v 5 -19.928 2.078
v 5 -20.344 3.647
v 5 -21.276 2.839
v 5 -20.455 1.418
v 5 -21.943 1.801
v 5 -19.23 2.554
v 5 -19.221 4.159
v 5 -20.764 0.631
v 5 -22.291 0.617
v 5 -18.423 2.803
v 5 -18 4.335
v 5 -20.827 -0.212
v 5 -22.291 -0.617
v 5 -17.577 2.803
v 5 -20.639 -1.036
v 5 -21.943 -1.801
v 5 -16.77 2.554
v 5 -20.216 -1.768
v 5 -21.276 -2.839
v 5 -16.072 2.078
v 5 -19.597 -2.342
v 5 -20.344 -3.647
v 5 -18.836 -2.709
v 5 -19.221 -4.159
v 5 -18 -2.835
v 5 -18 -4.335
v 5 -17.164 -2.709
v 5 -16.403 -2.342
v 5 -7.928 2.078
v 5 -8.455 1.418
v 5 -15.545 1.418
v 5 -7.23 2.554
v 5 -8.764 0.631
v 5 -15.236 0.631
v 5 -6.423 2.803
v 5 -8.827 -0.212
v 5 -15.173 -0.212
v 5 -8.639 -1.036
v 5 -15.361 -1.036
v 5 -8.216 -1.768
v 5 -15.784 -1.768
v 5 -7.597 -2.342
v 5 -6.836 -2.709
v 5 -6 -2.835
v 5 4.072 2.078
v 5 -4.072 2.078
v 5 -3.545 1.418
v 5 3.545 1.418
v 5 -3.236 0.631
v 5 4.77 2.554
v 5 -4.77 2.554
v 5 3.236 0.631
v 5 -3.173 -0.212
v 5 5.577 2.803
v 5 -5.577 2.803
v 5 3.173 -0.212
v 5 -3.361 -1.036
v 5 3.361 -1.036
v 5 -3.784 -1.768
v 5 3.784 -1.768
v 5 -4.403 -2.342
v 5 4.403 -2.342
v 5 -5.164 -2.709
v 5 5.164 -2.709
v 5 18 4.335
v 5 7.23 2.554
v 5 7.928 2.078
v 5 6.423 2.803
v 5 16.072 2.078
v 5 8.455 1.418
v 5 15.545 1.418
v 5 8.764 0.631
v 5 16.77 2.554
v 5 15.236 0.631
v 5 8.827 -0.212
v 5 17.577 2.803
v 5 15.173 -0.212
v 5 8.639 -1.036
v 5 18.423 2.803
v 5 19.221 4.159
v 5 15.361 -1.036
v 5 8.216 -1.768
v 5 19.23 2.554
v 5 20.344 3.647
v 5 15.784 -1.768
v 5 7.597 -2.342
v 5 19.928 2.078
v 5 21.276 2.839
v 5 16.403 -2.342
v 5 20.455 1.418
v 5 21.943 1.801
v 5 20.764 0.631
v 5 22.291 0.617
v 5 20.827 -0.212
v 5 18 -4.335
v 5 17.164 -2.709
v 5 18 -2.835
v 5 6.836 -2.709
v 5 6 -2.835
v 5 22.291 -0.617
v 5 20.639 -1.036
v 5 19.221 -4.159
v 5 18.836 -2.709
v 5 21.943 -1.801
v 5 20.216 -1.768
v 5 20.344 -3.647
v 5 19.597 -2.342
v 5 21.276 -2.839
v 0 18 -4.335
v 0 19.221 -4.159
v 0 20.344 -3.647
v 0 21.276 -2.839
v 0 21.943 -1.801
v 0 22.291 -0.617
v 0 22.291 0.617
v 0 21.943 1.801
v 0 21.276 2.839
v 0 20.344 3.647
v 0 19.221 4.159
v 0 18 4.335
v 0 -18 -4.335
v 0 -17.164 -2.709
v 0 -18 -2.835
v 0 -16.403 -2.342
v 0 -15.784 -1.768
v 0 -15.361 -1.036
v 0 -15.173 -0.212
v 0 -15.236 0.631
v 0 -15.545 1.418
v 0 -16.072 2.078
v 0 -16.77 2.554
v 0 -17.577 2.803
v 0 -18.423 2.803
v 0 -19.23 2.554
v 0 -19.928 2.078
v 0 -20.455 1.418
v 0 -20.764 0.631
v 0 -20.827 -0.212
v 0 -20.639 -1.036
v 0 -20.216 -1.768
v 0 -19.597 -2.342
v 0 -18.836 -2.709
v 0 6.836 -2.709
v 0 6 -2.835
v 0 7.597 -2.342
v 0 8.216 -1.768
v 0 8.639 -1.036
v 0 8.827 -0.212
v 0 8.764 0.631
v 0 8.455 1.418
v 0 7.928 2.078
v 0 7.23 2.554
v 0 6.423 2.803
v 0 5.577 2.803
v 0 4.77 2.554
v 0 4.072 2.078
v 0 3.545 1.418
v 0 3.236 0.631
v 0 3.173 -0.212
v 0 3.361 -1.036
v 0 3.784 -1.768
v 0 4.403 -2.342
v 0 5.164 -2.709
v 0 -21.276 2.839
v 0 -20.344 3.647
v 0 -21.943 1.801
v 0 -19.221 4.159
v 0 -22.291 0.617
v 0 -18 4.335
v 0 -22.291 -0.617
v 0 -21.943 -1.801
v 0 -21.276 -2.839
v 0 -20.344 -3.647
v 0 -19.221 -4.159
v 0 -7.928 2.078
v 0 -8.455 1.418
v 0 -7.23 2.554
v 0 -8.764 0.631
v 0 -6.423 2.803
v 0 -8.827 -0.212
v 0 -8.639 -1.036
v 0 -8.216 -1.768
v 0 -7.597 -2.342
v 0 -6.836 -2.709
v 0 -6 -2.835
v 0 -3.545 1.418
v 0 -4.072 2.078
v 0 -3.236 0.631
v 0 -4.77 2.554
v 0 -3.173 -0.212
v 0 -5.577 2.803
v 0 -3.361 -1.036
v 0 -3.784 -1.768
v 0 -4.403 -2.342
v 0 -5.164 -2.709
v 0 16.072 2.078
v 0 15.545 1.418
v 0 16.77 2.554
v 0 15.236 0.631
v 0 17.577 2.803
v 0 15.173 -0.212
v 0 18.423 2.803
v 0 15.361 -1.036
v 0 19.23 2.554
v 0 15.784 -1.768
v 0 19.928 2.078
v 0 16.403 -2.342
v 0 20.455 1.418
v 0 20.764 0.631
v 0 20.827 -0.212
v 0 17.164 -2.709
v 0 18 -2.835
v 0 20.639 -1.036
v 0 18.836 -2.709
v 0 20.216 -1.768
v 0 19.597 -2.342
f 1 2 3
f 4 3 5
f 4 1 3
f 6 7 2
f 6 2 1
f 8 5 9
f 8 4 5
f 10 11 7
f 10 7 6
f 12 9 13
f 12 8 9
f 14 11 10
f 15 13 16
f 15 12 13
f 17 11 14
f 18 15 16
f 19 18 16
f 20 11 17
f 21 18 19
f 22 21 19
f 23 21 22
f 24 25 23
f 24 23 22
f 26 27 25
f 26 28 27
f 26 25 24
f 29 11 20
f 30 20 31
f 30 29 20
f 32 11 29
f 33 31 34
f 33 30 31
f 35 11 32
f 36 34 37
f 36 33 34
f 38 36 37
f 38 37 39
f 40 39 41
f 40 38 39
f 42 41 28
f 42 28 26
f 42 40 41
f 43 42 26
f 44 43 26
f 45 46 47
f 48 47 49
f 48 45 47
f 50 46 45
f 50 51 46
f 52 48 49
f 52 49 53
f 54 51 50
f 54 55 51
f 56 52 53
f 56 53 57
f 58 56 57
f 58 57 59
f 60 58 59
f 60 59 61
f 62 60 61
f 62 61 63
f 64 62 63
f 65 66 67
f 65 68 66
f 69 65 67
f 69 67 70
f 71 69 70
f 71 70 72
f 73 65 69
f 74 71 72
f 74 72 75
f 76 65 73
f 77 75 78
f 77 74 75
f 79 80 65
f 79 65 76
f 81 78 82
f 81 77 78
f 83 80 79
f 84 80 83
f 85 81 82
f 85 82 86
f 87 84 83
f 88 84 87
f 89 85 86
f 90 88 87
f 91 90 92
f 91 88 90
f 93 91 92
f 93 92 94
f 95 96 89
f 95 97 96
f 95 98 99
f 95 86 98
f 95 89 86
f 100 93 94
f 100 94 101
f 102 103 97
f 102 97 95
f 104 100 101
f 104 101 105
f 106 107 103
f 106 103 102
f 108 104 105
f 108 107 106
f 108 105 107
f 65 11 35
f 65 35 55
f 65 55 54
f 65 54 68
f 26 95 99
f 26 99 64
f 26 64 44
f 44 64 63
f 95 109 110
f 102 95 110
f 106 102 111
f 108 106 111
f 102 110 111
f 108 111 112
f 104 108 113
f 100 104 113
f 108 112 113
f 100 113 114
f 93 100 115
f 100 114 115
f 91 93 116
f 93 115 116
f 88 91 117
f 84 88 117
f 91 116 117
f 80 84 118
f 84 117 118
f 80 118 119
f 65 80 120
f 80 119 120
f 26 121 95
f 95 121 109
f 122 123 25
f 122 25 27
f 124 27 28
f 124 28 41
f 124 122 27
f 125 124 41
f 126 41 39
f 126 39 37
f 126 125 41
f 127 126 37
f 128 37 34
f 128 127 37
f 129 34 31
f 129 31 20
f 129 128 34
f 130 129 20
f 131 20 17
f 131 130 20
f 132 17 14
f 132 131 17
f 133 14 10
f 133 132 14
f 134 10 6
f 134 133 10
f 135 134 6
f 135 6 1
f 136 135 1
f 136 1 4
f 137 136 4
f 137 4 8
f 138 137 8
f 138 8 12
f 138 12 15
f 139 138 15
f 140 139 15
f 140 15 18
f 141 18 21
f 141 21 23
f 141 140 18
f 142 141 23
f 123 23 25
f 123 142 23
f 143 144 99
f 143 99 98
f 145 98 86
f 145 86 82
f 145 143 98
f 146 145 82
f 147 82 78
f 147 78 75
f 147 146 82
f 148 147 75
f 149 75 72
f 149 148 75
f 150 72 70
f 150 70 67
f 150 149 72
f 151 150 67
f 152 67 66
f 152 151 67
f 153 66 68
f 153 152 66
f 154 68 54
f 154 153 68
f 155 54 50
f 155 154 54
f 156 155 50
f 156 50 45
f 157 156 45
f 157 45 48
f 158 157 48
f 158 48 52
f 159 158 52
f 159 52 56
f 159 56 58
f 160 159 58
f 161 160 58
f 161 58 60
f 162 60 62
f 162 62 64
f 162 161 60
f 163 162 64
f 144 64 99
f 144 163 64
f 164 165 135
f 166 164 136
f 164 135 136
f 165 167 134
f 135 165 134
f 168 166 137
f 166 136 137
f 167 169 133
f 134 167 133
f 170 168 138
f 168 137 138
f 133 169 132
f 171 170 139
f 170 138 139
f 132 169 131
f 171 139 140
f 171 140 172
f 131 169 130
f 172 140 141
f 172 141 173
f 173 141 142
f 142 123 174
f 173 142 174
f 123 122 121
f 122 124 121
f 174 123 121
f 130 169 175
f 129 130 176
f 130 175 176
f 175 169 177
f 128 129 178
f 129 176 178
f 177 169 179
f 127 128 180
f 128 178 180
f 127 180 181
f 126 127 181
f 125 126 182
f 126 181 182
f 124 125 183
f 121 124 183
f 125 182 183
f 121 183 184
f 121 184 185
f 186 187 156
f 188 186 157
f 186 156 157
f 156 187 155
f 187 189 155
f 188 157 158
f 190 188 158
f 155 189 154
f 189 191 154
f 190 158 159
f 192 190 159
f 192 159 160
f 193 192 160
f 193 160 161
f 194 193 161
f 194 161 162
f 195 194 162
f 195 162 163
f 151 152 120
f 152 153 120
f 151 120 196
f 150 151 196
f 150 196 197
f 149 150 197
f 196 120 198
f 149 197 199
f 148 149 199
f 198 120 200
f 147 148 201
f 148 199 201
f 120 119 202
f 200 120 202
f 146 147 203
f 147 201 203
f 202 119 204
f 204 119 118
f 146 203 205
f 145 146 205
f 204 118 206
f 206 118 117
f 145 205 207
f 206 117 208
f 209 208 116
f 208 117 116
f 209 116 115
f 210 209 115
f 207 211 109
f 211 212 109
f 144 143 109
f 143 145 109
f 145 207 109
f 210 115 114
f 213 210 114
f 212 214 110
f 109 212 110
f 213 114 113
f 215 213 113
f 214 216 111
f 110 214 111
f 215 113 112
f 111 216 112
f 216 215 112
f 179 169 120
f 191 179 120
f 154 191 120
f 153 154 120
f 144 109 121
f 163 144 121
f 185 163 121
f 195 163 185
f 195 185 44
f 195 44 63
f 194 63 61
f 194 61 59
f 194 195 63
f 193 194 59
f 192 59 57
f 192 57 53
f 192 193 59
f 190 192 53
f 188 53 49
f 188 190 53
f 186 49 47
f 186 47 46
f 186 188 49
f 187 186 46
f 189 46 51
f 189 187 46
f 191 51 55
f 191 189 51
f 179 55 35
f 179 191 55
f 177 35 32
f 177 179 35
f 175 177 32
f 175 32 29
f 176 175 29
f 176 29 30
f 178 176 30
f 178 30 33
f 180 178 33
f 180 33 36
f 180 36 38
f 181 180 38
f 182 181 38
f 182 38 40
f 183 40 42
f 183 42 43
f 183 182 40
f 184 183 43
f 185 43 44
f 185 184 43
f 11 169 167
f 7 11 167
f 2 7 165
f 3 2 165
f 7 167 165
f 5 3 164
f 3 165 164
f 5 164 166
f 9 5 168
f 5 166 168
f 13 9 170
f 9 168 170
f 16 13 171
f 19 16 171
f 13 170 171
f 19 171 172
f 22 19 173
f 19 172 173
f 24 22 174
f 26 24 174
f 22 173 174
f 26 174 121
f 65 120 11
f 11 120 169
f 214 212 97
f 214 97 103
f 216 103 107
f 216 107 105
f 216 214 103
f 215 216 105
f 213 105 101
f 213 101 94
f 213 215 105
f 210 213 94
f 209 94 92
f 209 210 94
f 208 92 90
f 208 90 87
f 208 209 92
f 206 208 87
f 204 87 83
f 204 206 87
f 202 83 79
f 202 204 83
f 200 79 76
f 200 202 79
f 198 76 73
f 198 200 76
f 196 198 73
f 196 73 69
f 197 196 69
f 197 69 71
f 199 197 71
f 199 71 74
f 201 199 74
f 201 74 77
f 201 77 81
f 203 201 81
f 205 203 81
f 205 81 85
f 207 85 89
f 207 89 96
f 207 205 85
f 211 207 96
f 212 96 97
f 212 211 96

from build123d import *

# Parameters (mm, degrees)
SKETCH_1_R          = 2.835000467
SKETCH_1_R_2        = 2.835
EXTRUDE_1_DEPTH     = 5
CUT_EXTRUDE_START   = -5
CUT_EXTRUDE_1_DEPTH = 5


with BuildPart() as part:
    # Эскиз1 → Бобышка-Вытянуть1 (new body)
    with BuildSketch(Plane(origin=(0, 0, 0), x_dir=(0, 0, -1), z_dir=(1, 0, 0))):
        with BuildLine():
            Line((-4.835001402, 17.999999558), (-4.835001402, -18.000000151))
            ThreePointArc((-4.835001402, -18.000000151), (-9.35e-07, -22.835000618), (4.834999533, -18.000000151))
            Line((4.834999533, -18.000000151), (4.834999533, 17.999999558))
            ThreePointArc((4.834999533, 17.999999558), (-9.35e-07, 22.835000025), (-4.835001402, 17.999999558))
        make_face()
        with Locations((0, 17.999999684)):
            Circle(SKETCH_1_R, mode=Mode.SUBTRACT)
        with Locations((-3.97e-07, 5.999999684)):
            Circle(SKETCH_1_R_2, mode=Mode.SUBTRACT)
        with Locations((-4.67e-07, -6.000000151)):
            Circle(SKETCH_1_R_2, mode=Mode.SUBTRACT)
        with Locations((-4.67e-07, -18.000000151)):
            Circle(SKETCH_1_R_2, mode=Mode.SUBTRACT)
    extrude(amount=EXTRUDE_1_DEPTH)

    # Эскиз2 → Вырез-Вытянуть1 (cut)
    with BuildSketch(Plane(origin=(5, 0, 0), x_dir=(0, 0, -1), z_dir=(1, 0, 0)).offset(CUT_EXTRUDE_START)):
        with BuildLine():
            Line((-4.835001402, 17.999999558), (-4.835001402, -18.000000151))
            ThreePointArc((-4.835001402, -18.000000151), (-9.35e-07, -22.835000618), (4.834999533, -18.000000151))
            Line((4.834999533, -18.000000151), (4.834999533, 17.999999558))
            ThreePointArc((4.834999533, 17.999999558), (-9.35e-07, 22.835000025), (-4.835001402, 17.999999558))
        make_face()
        with BuildLine():
            Line((-4.335001402, 17.999999558), (-4.335001402, -18.000000151))
            ThreePointArc((-4.335001402, -18.000000151), (-9.35e-07, -22.335000618), (4.334999533, -18.000000151))
            Line((4.334999533, -18.000000151), (4.334999533, 17.999999558))
            ThreePointArc((4.334999533, 17.999999558), (-9.35e-07, 22.335000025), (-4.335001402, 17.999999558))
        make_face(mode=Mode.SUBTRACT)
    extrude(amount=CUT_EXTRUDE_1_DEPTH, mode=Mode.SUBTRACT)


solid = part.part
